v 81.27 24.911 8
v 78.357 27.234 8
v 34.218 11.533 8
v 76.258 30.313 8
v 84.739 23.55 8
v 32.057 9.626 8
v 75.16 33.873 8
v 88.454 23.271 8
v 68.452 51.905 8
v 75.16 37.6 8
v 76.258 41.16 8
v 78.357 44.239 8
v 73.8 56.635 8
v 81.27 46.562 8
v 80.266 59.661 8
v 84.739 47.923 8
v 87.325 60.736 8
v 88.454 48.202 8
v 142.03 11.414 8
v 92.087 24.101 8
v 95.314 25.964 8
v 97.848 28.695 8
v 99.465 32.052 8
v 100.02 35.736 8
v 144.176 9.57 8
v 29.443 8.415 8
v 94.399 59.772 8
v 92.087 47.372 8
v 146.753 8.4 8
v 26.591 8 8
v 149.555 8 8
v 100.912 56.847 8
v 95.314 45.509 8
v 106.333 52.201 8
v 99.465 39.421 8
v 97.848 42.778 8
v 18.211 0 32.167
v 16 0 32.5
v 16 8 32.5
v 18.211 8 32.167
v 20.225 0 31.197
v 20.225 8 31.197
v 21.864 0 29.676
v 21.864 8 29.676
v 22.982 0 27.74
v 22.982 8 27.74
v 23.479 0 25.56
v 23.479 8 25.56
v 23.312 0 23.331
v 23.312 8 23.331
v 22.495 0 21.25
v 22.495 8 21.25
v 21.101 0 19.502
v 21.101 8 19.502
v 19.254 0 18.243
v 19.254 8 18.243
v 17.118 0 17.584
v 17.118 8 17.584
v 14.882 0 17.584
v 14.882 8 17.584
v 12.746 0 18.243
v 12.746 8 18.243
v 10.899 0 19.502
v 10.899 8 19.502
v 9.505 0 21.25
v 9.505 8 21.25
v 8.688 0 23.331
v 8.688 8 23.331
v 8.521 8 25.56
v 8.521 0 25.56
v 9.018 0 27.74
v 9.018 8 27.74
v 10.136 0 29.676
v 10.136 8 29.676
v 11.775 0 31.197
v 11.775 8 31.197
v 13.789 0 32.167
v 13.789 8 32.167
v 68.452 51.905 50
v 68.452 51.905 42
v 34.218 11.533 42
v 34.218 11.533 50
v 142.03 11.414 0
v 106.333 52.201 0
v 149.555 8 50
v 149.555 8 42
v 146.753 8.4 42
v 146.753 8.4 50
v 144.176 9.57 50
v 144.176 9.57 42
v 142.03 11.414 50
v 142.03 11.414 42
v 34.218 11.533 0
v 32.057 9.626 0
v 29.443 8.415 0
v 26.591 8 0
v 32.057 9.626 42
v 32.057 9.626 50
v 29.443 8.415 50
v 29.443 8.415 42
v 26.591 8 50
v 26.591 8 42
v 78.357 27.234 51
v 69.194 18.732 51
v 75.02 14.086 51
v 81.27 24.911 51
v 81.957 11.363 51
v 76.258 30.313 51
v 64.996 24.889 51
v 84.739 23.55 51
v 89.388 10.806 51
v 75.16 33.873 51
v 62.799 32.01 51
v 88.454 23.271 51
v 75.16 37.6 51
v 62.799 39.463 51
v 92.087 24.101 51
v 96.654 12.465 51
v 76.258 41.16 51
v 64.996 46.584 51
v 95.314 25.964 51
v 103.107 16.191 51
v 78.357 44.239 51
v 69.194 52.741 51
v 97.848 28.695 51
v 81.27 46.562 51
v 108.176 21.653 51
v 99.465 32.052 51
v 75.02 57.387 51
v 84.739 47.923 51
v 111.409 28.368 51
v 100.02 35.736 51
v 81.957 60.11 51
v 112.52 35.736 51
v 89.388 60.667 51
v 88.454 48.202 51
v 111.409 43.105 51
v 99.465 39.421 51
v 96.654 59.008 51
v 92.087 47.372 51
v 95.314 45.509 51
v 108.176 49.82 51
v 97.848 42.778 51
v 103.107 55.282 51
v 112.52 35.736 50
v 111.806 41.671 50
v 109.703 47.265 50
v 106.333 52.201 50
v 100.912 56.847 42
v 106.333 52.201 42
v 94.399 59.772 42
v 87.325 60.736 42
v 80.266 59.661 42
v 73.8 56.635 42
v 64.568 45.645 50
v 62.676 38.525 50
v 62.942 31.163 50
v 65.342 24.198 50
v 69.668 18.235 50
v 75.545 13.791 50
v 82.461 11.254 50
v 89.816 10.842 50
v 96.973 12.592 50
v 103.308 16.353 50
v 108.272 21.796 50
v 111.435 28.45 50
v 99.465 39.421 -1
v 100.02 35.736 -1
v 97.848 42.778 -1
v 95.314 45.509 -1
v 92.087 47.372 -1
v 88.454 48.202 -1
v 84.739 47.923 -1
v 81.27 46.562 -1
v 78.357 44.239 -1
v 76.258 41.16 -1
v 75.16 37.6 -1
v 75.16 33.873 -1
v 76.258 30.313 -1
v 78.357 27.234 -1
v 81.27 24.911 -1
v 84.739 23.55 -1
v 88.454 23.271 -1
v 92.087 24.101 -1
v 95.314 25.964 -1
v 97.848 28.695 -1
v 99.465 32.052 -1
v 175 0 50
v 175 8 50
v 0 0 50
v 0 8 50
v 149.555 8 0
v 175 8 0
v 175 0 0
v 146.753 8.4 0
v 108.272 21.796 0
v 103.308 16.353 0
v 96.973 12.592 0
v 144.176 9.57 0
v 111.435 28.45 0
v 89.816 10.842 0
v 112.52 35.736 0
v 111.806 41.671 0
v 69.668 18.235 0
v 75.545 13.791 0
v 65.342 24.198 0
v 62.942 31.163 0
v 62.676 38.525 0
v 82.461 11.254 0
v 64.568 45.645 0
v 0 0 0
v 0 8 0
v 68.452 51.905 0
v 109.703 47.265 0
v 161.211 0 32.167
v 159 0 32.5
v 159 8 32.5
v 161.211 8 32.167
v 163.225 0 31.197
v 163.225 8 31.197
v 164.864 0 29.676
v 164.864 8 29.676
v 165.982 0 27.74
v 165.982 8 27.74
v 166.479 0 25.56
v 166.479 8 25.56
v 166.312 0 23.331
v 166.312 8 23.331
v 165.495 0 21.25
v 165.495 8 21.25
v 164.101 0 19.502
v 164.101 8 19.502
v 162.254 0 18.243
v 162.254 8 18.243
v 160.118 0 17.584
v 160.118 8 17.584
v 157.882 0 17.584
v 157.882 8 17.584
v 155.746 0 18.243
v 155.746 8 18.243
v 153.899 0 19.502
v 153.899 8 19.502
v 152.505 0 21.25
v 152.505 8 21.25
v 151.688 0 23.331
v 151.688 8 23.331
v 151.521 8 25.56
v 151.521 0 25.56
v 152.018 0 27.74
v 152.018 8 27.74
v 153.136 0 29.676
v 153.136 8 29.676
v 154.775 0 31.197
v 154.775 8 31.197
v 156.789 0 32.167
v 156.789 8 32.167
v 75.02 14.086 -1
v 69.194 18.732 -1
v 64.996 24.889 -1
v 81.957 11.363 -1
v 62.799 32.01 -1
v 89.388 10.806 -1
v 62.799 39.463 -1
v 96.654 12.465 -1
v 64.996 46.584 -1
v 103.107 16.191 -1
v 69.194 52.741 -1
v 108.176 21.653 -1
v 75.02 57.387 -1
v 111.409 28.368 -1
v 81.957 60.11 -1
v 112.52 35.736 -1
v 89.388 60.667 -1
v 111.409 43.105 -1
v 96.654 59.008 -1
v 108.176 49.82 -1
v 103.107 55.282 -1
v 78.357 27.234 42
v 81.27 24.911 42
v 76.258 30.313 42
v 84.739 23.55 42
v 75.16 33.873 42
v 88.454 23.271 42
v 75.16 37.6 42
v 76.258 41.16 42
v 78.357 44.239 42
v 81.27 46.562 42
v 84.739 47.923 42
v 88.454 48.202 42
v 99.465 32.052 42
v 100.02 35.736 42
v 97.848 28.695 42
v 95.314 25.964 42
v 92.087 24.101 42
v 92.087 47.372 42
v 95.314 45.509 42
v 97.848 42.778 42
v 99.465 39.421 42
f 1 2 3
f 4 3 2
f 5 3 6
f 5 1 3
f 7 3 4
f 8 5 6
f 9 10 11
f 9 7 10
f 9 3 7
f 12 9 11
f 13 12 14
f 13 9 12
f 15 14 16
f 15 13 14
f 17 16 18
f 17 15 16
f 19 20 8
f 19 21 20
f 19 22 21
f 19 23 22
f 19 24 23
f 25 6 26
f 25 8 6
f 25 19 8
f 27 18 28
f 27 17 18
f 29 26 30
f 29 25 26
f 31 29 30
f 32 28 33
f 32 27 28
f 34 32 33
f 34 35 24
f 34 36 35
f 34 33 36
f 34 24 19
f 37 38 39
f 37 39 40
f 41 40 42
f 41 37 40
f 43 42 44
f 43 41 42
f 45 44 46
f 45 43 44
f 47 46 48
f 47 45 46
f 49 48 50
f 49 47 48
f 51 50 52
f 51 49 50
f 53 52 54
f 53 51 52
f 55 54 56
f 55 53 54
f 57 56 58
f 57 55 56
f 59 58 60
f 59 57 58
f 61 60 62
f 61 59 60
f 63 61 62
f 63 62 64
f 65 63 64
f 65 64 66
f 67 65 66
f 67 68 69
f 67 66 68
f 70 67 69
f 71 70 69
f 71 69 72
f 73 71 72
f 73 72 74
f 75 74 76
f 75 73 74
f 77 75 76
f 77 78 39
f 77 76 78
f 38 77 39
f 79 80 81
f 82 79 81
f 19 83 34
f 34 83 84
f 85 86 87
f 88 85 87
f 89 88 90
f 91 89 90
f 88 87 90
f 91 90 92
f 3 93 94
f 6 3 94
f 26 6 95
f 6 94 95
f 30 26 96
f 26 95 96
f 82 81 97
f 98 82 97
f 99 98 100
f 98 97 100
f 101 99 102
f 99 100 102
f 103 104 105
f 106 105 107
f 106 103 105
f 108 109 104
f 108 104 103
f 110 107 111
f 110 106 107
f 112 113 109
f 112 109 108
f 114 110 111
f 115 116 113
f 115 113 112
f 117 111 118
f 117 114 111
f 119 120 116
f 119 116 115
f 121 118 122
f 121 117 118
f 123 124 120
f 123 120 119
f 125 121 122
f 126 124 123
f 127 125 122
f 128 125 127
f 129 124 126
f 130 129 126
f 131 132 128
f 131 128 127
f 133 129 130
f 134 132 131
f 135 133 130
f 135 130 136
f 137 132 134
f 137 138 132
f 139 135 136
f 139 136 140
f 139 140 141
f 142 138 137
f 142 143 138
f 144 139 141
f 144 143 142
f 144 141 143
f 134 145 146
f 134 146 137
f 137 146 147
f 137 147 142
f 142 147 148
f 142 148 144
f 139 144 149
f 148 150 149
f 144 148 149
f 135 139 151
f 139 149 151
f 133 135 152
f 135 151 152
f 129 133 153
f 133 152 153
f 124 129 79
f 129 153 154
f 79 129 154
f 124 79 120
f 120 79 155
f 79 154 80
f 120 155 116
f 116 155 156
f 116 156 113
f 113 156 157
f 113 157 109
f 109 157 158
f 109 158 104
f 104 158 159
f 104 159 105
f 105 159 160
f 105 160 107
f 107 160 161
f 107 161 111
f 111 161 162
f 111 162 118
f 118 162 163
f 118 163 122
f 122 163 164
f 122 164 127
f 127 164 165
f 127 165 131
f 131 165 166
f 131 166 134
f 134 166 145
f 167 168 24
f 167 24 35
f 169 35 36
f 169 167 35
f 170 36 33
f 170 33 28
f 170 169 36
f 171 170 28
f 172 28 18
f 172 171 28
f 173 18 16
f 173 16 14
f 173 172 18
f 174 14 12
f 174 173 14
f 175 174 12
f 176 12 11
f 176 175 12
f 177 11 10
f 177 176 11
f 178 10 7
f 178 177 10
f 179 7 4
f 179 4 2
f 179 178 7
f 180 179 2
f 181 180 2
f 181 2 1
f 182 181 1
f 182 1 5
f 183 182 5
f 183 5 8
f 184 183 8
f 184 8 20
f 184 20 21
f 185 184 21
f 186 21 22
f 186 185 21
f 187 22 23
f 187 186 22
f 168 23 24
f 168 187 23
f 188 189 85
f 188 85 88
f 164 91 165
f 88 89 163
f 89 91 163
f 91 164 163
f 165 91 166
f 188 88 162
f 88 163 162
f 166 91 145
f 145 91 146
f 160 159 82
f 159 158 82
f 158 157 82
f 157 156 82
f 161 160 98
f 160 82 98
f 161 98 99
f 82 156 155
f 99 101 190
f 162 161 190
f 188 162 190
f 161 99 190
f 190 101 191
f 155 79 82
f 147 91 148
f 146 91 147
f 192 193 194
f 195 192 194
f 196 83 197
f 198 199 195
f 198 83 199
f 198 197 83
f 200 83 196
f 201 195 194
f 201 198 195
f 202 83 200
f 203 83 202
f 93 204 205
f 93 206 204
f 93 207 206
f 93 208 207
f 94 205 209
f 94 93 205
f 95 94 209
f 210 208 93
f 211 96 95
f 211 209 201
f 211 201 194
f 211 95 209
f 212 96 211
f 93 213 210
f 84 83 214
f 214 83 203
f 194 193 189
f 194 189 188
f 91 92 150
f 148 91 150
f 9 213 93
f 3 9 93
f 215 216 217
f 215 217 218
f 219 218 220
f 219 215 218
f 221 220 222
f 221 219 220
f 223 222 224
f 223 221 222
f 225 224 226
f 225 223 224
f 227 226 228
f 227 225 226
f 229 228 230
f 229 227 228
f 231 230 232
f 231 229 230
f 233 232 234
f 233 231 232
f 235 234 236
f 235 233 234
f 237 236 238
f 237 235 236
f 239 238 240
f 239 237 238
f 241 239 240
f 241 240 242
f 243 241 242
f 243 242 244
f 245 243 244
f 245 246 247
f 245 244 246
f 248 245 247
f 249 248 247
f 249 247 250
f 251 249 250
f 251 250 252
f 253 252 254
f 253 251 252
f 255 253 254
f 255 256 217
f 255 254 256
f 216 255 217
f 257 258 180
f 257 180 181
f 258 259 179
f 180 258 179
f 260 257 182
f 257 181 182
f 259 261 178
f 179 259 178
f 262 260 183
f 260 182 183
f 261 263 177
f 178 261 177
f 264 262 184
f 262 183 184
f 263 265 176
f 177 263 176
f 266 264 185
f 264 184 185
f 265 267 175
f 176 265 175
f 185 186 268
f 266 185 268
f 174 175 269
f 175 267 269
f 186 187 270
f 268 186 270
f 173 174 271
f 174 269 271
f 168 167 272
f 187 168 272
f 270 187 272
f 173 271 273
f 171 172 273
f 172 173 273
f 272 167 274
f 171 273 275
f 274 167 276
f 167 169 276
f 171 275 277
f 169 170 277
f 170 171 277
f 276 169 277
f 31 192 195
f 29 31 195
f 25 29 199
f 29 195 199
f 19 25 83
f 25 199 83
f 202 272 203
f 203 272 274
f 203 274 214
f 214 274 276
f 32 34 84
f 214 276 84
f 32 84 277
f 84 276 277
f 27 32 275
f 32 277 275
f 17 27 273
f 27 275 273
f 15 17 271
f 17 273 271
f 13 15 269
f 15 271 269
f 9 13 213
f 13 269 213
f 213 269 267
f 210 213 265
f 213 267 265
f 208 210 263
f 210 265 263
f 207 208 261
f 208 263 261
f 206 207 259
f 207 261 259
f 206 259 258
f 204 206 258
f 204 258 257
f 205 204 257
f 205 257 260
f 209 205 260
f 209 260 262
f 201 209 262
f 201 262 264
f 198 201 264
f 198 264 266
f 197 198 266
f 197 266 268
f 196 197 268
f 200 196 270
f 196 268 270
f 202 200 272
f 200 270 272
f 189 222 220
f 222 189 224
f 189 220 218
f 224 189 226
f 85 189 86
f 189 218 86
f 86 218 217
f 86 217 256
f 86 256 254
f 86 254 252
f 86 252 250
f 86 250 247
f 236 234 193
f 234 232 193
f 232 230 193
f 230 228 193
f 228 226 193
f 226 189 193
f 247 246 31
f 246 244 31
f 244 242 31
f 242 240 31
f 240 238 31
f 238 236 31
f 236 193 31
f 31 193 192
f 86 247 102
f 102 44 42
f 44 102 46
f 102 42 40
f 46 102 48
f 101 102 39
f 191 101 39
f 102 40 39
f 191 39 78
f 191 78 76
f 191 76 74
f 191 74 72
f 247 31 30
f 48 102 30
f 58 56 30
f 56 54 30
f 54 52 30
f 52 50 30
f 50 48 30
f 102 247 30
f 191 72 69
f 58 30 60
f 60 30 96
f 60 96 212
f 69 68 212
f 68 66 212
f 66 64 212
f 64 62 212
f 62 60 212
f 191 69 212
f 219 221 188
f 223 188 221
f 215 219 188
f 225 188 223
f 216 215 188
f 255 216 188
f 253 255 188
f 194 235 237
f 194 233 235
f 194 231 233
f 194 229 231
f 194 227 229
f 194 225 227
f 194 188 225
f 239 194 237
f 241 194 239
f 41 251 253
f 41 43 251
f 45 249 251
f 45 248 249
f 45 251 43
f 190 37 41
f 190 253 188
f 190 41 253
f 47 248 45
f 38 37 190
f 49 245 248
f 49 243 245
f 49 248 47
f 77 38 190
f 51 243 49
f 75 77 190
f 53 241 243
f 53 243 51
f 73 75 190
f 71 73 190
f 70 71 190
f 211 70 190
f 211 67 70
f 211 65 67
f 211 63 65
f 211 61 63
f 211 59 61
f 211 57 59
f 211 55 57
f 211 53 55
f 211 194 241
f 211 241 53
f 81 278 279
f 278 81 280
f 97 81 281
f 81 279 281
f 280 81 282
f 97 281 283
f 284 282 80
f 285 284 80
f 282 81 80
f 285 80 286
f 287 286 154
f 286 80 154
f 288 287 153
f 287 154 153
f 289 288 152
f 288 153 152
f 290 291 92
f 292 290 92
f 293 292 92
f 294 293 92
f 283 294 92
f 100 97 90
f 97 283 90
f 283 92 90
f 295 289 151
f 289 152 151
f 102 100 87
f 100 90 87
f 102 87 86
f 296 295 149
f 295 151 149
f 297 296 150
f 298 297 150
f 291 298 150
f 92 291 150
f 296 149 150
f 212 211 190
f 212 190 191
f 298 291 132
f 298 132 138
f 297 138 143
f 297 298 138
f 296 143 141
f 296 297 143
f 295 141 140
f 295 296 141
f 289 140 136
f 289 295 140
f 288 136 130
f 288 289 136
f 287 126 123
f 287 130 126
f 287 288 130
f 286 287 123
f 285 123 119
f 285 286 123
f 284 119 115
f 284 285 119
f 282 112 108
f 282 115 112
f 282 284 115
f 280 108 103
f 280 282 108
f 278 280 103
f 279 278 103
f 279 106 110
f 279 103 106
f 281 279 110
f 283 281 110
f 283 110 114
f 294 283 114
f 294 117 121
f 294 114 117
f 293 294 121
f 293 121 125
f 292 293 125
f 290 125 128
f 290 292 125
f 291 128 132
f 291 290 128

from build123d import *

# Parameters (mm, degrees)
BOSS_EXTRUDE1_DEPTH     = 50
BOSS_EXTRUDE3_DEPTH     = 8
BOSS_EXTRUDE4_START     = 42
BOSS_EXTRUDE4_DEPTH     = 8
BOSS_EXTRUDE5_START     = -1
SKETCH1_6_R             = 25
SKETCH1_6_R_2           = 12.5
BOSS_EXTRUDE5_DEPTH     = 9
BOSS_EXTRUDE7_START     = 42
SKETCH1_8_R             = 25
BOSS_EXTRUDE7_DEPTH     = 9
CUT_EXTRUDE1_DEPTH      = 193.132564476
CUT_EXTRUDE1_DEPTH_BACK = 193.132564476
SKETCH1_10_R            = 12.5
CUT_EXTRUDE2_DEPTH      = 190.755469869
CUT_EXTRUDE2_DEPTH_BACK = 190.755469869
SKETCH2_R               = 7.5


with BuildPart() as part:
    # Sketch1 → Boss-Extrude1 (new body)
    with BuildSketch(Plane.XY):
        Polygon((26.59102299, 8), (149.554580342, 8), (175, 8), (175, 0), (0, 0), (0, 8), align=None)
    extrude(amount=BOSS_EXTRUDE1_DEPTH)

    # Sketch1<4> → Boss-Extrude3 (add)
    with BuildSketch(Plane.XY):
        with BuildLine():
            ThreePointArc((34.21809324, 11.532558512), (30.793735514, 8.926014798), (26.59102299, 8))
            Line((26.59102299, 8), (149.554580342, 8))
            ThreePointArc((149.554580342, 8), (145.422937943, 8.893434726), (142.029566102, 11.414093784))
            Line((142.029566102, 11.414093784), (106.332559555, 52.201264717))
            ThreePointArc((106.332559555, 52.201264717), (110.922089996, 44.531003426), (112.520023955, 35.736499176))
            ThreePointArc((112.520023955, 35.736499176), (78.908749097, 12.266391692), (68.45234833, 51.905102896))
            Line((68.45234833, 51.905102896), (34.21809324, 11.532558512))
        make_face()
    extrude(amount=BOSS_EXTRUDE3_DEPTH)

    # Sketch1<5> → Boss-Extrude4 (add)
    with BuildSketch(Plane.XY.offset(BOSS_EXTRUDE4_START)):
        with BuildLine():
            ThreePointArc((34.21809324, 11.532558512), (30.793735514, 8.926014798), (26.59102299, 8))
            Line((26.59102299, 8), (149.554580342, 8))
            ThreePointArc((149.554580342, 8), (145.422937943, 8.893434726), (142.029566102, 11.414093784))
            Line((142.029566102, 11.414093784), (106.332559555, 52.201264717))
            ThreePointArc((106.332559555, 52.201264717), (110.922089996, 44.531003426), (112.520023955, 35.736499176))
            ThreePointArc((112.520023955, 35.736499176), (78.908749097, 12.266391692), (68.45234833, 51.905102896))
            Line((68.45234833, 51.905102896), (34.21809324, 11.532558512))
        make_face()
    extrude(amount=BOSS_EXTRUDE4_DEPTH)

    # Sketch1<6> → Boss-Extrude5 (add)
    with BuildSketch(Plane.XY.offset(BOSS_EXTRUDE5_START)):
        with Locations((87.520023955, 35.736499176)):
            Circle(SKETCH1_6_R)
        with Locations((87.520023955, 35.736499176)):
            Circle(SKETCH1_6_R_2, mode=Mode.SUBTRACT)
    extrude(amount=BOSS_EXTRUDE5_DEPTH)

    # Sketch1<8> → Boss-Extrude7 (add)
    with BuildSketch(Plane.XY.offset(BOSS_EXTRUDE7_START)):
        with Locations((87.520023955, 35.736499176)):
            Circle(SKETCH1_8_R)
    extrude(amount=BOSS_EXTRUDE7_DEPTH)

    # Sketch1<10> → Cut-Extrude1 (cut, two sides: drawn at the far end of the back side and taken through both)
    with BuildSketch(Plane.XY.offset(-CUT_EXTRUDE1_DEPTH_BACK)):
        with Locations((87.520023955, 35.736499176)):
            Circle(SKETCH1_10_R)
    extrude(amount=CUT_EXTRUDE1_DEPTH + CUT_EXTRUDE1_DEPTH_BACK, mode=Mode.SUBTRACT)

    # Sketch2 → Cut-Extrude2 (cut, two sides: drawn at the far end of the back side and taken through both)
    with BuildSketch(Plane(origin=(0, 8, 0), x_dir=(1, 0, 0), z_dir=(0, 1, 0)).offset(-CUT_EXTRUDE2_DEPTH_BACK)):
        with Locations(Location((16, -25, 0), (0, 0, 270))):
            Circle(SKETCH2_R)
        with Locations(Location((159, -25, 0), (0, 0, 270))):
            Circle(SKETCH2_R)
    extrude(amount=CUT_EXTRUDE2_DEPTH + CUT_EXTRUDE2_DEPTH_BACK, mode=Mode.SUBTRACT)


solid = part.part
